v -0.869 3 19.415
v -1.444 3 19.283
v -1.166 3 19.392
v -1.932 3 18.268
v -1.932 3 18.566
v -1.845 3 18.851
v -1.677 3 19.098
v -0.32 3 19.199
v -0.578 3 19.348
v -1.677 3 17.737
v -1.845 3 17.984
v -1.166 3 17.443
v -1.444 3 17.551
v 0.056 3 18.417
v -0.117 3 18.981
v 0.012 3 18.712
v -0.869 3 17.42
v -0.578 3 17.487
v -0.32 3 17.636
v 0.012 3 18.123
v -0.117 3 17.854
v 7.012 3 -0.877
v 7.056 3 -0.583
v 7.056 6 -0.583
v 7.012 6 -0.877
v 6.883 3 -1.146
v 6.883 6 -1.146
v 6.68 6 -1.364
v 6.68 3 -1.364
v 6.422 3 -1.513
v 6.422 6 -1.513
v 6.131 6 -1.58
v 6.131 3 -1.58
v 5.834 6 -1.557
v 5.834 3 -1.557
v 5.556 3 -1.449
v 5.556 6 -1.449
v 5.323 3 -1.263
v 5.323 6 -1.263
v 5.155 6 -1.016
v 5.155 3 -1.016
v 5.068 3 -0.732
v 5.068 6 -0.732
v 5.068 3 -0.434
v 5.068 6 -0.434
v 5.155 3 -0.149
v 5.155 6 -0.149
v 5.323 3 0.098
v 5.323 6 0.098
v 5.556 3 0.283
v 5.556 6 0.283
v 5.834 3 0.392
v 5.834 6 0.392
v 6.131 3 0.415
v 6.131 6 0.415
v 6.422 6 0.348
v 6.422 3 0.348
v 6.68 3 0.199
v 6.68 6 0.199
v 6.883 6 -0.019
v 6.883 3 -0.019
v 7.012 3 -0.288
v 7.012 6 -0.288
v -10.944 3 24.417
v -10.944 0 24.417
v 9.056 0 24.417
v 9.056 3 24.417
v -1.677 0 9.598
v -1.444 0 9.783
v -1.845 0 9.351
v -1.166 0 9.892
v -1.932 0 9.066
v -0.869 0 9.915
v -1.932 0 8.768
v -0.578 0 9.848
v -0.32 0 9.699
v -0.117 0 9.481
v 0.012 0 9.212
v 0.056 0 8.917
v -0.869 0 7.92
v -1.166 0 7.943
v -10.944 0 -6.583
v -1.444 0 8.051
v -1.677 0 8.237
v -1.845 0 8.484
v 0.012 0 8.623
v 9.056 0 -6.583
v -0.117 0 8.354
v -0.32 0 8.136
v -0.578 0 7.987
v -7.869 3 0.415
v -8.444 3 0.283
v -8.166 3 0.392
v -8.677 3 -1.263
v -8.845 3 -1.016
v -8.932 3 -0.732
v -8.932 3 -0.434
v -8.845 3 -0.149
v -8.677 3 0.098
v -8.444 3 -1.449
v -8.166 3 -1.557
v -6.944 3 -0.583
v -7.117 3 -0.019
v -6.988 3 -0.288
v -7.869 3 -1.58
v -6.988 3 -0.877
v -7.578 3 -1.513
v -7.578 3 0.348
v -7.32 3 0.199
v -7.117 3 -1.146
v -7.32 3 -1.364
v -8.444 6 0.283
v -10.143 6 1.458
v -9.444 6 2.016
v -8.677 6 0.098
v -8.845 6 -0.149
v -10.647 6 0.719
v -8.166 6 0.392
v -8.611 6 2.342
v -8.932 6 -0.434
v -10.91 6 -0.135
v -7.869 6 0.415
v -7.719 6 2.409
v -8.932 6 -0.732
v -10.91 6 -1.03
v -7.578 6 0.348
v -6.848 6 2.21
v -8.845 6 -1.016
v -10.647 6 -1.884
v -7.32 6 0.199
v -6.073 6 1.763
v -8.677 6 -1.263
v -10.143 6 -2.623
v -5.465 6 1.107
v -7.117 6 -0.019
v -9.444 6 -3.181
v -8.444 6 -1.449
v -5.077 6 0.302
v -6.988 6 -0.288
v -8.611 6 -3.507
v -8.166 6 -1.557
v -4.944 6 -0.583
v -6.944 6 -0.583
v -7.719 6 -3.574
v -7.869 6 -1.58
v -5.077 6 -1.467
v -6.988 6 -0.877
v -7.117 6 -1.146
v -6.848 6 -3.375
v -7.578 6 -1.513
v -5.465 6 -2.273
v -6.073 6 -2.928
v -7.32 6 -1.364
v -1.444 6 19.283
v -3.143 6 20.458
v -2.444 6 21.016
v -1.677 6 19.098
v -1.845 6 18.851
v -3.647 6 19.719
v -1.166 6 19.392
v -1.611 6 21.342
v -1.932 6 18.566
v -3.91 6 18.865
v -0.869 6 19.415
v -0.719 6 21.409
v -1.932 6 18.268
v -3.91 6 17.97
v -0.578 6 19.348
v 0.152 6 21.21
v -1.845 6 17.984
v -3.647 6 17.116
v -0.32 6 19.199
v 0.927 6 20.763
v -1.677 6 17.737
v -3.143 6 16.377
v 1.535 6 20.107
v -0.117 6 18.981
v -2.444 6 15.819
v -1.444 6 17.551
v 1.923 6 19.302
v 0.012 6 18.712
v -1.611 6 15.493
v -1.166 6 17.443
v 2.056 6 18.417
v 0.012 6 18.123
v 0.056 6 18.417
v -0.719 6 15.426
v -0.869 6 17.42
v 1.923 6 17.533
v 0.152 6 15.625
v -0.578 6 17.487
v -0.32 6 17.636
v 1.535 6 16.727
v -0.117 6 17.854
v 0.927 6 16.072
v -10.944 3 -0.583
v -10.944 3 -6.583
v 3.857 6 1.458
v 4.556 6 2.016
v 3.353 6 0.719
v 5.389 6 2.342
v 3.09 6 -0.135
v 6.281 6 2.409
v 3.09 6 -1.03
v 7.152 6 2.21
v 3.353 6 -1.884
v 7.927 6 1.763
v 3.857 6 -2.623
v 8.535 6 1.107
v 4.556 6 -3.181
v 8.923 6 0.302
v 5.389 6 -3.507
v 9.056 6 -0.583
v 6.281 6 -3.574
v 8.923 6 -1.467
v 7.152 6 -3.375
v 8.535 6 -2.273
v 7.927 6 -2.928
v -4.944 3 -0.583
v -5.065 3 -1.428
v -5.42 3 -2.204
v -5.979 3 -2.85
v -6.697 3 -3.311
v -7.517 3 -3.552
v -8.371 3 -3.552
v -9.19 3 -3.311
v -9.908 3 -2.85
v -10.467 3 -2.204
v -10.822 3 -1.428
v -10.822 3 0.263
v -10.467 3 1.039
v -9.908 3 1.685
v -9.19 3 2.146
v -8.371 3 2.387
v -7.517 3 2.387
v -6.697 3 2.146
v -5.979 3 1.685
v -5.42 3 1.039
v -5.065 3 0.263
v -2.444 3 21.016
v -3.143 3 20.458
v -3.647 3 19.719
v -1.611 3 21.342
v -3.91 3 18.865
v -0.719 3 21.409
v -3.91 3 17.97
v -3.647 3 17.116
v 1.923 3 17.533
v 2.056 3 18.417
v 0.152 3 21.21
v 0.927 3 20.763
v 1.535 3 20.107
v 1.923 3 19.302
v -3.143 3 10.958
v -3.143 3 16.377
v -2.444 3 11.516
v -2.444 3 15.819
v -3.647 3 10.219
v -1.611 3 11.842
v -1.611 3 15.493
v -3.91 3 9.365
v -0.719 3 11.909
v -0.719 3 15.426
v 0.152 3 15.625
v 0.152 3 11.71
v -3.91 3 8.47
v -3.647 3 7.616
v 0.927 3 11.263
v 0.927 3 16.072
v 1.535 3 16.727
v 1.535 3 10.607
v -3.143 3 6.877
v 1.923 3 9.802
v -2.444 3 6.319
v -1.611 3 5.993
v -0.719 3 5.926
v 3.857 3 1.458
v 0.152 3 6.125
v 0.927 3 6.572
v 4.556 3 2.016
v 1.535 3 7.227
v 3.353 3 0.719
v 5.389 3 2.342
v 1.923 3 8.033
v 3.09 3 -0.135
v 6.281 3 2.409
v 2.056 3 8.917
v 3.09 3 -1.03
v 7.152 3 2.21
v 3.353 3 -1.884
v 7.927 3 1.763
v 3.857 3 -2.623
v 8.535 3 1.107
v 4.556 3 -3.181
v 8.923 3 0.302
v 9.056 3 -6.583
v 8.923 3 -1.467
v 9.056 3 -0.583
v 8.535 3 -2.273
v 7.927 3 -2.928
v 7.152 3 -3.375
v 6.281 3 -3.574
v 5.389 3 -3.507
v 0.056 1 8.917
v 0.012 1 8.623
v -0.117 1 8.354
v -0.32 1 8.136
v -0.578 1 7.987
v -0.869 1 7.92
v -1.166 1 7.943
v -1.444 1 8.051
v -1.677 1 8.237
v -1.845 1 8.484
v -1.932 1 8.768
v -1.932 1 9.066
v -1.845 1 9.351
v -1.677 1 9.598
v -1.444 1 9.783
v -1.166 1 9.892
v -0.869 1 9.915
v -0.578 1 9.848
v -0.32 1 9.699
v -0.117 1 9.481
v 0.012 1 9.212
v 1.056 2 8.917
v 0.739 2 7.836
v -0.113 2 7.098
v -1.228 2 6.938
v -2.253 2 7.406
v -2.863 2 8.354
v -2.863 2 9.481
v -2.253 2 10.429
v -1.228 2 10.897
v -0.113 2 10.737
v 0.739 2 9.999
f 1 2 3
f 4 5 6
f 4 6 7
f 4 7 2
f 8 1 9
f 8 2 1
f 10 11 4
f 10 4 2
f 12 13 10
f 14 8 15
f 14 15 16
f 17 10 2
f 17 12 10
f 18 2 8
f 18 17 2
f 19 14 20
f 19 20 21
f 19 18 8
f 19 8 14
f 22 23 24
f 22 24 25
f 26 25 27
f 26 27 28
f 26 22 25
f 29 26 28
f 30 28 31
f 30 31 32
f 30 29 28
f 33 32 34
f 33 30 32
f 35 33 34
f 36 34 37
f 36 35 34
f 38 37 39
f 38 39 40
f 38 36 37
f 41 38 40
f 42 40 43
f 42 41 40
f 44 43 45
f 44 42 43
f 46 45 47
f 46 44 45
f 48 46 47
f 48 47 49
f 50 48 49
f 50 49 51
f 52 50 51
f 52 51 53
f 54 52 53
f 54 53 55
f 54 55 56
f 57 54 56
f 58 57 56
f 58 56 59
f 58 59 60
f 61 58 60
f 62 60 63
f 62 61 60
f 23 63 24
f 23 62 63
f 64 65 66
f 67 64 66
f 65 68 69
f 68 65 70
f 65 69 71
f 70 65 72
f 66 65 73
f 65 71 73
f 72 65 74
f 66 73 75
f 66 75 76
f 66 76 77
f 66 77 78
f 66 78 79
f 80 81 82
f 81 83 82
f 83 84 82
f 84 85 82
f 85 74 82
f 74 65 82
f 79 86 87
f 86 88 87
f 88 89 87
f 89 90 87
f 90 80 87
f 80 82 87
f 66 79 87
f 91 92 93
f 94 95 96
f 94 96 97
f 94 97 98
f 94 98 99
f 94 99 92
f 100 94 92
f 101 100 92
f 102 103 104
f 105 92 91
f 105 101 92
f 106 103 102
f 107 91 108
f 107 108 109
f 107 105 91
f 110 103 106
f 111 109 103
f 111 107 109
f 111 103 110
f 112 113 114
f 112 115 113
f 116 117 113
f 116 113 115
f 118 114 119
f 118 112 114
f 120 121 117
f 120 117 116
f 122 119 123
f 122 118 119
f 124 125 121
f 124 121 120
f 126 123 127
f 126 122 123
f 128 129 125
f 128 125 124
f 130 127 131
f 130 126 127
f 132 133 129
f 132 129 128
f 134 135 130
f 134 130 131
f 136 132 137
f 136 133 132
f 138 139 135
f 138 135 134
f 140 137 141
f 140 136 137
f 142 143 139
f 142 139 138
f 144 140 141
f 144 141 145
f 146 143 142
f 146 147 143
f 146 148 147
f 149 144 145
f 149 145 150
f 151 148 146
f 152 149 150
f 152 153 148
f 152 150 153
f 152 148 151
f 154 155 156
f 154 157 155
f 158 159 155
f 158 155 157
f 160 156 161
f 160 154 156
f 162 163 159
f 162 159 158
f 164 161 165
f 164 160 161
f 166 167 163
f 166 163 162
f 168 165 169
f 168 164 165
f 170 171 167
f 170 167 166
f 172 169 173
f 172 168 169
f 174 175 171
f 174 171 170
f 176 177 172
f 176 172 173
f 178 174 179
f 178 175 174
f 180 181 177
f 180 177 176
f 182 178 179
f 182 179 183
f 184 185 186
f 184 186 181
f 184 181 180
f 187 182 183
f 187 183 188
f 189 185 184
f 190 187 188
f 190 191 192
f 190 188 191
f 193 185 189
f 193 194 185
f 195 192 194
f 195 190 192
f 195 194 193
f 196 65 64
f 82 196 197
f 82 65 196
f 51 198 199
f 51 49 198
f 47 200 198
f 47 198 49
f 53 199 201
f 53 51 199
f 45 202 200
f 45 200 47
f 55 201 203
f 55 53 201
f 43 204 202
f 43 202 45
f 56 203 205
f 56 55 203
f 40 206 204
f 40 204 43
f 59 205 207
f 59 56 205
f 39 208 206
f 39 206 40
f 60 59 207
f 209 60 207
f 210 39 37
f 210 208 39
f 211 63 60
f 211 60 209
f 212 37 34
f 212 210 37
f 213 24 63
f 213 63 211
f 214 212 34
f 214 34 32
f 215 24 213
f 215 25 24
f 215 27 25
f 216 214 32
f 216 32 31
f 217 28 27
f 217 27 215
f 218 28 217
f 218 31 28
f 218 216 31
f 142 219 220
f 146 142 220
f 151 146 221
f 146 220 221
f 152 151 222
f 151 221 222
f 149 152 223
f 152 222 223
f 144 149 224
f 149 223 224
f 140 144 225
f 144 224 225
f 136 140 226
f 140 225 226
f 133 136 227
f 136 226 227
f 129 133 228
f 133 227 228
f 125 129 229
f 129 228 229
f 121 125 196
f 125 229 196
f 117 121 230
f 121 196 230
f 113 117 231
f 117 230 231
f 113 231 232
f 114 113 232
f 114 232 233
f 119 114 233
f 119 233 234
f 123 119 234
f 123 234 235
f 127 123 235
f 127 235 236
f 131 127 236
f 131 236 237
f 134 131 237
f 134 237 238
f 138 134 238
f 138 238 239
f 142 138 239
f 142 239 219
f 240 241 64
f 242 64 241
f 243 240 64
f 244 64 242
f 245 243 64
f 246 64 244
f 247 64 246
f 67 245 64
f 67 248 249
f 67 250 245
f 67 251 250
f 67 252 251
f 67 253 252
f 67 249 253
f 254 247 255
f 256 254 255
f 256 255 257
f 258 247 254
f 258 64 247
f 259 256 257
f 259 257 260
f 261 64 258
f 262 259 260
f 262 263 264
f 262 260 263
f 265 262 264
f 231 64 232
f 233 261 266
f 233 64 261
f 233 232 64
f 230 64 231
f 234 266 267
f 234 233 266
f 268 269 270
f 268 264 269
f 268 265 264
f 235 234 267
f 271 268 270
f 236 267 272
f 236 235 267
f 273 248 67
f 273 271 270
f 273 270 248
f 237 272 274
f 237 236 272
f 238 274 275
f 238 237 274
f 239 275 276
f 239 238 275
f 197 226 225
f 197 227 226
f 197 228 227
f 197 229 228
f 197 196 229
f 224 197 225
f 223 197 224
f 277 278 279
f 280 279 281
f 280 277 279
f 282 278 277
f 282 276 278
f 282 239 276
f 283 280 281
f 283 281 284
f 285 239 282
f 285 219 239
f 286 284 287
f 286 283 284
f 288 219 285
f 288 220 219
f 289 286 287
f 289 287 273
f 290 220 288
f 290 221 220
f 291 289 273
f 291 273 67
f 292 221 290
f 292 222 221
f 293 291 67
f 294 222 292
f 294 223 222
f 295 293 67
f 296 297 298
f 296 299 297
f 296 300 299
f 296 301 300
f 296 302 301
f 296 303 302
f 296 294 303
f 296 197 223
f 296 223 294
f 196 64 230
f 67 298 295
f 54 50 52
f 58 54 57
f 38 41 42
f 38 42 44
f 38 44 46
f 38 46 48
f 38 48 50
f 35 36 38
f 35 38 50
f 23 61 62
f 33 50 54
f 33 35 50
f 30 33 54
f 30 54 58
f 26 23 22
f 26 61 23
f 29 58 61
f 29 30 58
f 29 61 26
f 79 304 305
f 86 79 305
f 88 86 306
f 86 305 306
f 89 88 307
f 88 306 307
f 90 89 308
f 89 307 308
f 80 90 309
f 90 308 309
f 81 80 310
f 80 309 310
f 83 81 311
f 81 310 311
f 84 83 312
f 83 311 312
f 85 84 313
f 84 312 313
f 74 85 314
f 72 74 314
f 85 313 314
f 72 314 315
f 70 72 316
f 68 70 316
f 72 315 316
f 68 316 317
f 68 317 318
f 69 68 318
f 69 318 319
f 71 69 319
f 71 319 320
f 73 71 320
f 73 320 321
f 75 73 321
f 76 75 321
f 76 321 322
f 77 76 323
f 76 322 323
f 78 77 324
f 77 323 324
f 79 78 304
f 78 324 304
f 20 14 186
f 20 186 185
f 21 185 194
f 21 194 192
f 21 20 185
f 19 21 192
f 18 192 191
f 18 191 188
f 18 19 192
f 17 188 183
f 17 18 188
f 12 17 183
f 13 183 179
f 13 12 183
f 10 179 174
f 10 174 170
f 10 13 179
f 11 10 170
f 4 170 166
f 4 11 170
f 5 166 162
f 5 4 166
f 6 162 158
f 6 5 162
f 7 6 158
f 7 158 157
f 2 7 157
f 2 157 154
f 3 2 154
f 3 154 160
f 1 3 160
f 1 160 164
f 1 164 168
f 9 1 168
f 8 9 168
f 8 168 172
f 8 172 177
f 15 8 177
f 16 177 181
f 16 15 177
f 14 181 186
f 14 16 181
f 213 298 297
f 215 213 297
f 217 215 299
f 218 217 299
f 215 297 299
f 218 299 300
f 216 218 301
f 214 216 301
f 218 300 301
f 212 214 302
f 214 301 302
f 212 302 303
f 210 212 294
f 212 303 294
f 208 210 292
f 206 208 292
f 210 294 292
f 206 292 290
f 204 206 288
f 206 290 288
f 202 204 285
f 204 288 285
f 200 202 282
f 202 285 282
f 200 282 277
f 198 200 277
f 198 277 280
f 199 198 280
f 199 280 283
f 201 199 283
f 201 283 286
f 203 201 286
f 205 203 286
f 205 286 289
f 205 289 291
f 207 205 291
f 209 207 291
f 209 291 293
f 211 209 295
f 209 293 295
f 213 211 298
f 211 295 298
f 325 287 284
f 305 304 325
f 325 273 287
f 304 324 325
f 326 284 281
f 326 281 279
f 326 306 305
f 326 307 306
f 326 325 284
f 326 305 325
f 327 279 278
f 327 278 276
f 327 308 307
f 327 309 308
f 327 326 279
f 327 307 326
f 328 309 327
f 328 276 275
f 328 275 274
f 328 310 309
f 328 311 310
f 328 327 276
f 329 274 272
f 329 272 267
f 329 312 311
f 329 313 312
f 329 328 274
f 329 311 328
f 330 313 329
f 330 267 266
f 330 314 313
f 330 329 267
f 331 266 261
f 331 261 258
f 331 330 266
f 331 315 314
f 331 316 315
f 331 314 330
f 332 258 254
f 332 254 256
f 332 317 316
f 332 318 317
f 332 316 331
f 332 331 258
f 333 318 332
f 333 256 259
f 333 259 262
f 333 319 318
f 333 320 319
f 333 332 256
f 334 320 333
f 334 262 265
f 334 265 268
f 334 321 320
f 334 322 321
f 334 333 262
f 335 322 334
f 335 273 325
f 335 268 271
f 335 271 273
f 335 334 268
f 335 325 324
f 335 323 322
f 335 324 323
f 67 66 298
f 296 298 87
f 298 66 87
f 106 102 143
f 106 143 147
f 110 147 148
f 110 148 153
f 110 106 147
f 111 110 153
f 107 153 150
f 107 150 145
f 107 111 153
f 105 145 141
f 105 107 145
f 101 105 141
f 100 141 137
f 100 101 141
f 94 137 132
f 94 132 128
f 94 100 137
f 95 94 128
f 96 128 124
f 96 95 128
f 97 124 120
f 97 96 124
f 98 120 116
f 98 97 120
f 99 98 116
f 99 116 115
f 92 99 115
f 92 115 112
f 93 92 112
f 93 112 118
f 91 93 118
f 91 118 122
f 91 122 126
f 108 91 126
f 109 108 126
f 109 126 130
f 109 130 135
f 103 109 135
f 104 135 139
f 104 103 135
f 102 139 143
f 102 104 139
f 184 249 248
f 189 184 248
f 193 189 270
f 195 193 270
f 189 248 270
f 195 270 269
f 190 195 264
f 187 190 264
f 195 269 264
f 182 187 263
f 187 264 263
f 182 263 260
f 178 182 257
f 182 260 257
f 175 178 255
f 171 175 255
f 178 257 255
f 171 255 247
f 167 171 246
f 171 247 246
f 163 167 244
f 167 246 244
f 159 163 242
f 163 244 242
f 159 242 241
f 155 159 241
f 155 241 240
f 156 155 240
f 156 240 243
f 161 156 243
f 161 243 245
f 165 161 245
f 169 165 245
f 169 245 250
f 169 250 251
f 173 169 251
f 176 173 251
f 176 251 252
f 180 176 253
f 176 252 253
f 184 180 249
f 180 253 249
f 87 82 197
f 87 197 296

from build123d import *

# Parameters (mm, degrees)
SKETCH_1_W          = 20
SKETCH_1_H          = 31
EXTRUDE_1_DEPTH     = 3
SKETCH_3_R          = 3
SKETCH_3_R_2        = 1
EXTRUDE_2_DEPTH     = 3
SKETCH_4_R          = 1
CUT_EXTRUDE_1_DEPTH = 3
CHAMFER_1_SIZE      = 2


with BuildPart() as part:
    # Эскиз1 → Бобышка-Вытянуть1 (new body)
    with BuildSketch(Plane(origin=(0, 0, 0), x_dir=(1, 0, 0), z_dir=(0, 1, 0))):
        with Locations((-0.943604651, -8.91744186)):
            Rectangle(SKETCH_1_W, SKETCH_1_H)
    extrude(amount=EXTRUDE_1_DEPTH)

    # Эскиз3 → Бобышка-Вытянуть2 (add)
    with BuildSketch(Plane(origin=(0, 3, 0), x_dir=(1, 0, 0), z_dir=(0, 1, 0))):
        with Locations((-7.943604651, 0.58255814)):
            Circle(SKETCH_3_R)
        with Locations((-7.943604651, 0.58255814)):
            Circle(SKETCH_3_R_2, mode=Mode.SUBTRACT)
        with Locations((6.056395349, 0.58255814)):
            Circle(SKETCH_3_R)
        with Locations((6.056395349, 0.58255814)):
            Circle(SKETCH_3_R_2, mode=Mode.SUBTRACT)
        with Locations((-0.943604651, -18.41744186)):
            Circle(SKETCH_3_R)
        with Locations((-0.943604651, -18.41744186)):
            Circle(SKETCH_3_R_2, mode=Mode.SUBTRACT)
    extrude(amount=EXTRUDE_2_DEPTH)

    # Эскиз4 → Вырез-Вытянуть1 (cut)
    with BuildSketch(Plane(origin=(0, 3, 0), x_dir=(1, 0, 0), z_dir=(0, 1, 0))):
        with Locations((-0.943604651, -8.91744186)):
            Circle(SKETCH_4_R)
    extrude(amount=-CUT_EXTRUDE_1_DEPTH, mode=Mode.SUBTRACT)

    # Фаска1
    chamfer_1_edges = [part.edges().sort_by_distance(p)[0] for p in [
        (-1.943604651, 3, 8.91744186),
    ]]
    chamfer(chamfer_1_edges, length=CHAMFER_1_SIZE)


solid = part.part
